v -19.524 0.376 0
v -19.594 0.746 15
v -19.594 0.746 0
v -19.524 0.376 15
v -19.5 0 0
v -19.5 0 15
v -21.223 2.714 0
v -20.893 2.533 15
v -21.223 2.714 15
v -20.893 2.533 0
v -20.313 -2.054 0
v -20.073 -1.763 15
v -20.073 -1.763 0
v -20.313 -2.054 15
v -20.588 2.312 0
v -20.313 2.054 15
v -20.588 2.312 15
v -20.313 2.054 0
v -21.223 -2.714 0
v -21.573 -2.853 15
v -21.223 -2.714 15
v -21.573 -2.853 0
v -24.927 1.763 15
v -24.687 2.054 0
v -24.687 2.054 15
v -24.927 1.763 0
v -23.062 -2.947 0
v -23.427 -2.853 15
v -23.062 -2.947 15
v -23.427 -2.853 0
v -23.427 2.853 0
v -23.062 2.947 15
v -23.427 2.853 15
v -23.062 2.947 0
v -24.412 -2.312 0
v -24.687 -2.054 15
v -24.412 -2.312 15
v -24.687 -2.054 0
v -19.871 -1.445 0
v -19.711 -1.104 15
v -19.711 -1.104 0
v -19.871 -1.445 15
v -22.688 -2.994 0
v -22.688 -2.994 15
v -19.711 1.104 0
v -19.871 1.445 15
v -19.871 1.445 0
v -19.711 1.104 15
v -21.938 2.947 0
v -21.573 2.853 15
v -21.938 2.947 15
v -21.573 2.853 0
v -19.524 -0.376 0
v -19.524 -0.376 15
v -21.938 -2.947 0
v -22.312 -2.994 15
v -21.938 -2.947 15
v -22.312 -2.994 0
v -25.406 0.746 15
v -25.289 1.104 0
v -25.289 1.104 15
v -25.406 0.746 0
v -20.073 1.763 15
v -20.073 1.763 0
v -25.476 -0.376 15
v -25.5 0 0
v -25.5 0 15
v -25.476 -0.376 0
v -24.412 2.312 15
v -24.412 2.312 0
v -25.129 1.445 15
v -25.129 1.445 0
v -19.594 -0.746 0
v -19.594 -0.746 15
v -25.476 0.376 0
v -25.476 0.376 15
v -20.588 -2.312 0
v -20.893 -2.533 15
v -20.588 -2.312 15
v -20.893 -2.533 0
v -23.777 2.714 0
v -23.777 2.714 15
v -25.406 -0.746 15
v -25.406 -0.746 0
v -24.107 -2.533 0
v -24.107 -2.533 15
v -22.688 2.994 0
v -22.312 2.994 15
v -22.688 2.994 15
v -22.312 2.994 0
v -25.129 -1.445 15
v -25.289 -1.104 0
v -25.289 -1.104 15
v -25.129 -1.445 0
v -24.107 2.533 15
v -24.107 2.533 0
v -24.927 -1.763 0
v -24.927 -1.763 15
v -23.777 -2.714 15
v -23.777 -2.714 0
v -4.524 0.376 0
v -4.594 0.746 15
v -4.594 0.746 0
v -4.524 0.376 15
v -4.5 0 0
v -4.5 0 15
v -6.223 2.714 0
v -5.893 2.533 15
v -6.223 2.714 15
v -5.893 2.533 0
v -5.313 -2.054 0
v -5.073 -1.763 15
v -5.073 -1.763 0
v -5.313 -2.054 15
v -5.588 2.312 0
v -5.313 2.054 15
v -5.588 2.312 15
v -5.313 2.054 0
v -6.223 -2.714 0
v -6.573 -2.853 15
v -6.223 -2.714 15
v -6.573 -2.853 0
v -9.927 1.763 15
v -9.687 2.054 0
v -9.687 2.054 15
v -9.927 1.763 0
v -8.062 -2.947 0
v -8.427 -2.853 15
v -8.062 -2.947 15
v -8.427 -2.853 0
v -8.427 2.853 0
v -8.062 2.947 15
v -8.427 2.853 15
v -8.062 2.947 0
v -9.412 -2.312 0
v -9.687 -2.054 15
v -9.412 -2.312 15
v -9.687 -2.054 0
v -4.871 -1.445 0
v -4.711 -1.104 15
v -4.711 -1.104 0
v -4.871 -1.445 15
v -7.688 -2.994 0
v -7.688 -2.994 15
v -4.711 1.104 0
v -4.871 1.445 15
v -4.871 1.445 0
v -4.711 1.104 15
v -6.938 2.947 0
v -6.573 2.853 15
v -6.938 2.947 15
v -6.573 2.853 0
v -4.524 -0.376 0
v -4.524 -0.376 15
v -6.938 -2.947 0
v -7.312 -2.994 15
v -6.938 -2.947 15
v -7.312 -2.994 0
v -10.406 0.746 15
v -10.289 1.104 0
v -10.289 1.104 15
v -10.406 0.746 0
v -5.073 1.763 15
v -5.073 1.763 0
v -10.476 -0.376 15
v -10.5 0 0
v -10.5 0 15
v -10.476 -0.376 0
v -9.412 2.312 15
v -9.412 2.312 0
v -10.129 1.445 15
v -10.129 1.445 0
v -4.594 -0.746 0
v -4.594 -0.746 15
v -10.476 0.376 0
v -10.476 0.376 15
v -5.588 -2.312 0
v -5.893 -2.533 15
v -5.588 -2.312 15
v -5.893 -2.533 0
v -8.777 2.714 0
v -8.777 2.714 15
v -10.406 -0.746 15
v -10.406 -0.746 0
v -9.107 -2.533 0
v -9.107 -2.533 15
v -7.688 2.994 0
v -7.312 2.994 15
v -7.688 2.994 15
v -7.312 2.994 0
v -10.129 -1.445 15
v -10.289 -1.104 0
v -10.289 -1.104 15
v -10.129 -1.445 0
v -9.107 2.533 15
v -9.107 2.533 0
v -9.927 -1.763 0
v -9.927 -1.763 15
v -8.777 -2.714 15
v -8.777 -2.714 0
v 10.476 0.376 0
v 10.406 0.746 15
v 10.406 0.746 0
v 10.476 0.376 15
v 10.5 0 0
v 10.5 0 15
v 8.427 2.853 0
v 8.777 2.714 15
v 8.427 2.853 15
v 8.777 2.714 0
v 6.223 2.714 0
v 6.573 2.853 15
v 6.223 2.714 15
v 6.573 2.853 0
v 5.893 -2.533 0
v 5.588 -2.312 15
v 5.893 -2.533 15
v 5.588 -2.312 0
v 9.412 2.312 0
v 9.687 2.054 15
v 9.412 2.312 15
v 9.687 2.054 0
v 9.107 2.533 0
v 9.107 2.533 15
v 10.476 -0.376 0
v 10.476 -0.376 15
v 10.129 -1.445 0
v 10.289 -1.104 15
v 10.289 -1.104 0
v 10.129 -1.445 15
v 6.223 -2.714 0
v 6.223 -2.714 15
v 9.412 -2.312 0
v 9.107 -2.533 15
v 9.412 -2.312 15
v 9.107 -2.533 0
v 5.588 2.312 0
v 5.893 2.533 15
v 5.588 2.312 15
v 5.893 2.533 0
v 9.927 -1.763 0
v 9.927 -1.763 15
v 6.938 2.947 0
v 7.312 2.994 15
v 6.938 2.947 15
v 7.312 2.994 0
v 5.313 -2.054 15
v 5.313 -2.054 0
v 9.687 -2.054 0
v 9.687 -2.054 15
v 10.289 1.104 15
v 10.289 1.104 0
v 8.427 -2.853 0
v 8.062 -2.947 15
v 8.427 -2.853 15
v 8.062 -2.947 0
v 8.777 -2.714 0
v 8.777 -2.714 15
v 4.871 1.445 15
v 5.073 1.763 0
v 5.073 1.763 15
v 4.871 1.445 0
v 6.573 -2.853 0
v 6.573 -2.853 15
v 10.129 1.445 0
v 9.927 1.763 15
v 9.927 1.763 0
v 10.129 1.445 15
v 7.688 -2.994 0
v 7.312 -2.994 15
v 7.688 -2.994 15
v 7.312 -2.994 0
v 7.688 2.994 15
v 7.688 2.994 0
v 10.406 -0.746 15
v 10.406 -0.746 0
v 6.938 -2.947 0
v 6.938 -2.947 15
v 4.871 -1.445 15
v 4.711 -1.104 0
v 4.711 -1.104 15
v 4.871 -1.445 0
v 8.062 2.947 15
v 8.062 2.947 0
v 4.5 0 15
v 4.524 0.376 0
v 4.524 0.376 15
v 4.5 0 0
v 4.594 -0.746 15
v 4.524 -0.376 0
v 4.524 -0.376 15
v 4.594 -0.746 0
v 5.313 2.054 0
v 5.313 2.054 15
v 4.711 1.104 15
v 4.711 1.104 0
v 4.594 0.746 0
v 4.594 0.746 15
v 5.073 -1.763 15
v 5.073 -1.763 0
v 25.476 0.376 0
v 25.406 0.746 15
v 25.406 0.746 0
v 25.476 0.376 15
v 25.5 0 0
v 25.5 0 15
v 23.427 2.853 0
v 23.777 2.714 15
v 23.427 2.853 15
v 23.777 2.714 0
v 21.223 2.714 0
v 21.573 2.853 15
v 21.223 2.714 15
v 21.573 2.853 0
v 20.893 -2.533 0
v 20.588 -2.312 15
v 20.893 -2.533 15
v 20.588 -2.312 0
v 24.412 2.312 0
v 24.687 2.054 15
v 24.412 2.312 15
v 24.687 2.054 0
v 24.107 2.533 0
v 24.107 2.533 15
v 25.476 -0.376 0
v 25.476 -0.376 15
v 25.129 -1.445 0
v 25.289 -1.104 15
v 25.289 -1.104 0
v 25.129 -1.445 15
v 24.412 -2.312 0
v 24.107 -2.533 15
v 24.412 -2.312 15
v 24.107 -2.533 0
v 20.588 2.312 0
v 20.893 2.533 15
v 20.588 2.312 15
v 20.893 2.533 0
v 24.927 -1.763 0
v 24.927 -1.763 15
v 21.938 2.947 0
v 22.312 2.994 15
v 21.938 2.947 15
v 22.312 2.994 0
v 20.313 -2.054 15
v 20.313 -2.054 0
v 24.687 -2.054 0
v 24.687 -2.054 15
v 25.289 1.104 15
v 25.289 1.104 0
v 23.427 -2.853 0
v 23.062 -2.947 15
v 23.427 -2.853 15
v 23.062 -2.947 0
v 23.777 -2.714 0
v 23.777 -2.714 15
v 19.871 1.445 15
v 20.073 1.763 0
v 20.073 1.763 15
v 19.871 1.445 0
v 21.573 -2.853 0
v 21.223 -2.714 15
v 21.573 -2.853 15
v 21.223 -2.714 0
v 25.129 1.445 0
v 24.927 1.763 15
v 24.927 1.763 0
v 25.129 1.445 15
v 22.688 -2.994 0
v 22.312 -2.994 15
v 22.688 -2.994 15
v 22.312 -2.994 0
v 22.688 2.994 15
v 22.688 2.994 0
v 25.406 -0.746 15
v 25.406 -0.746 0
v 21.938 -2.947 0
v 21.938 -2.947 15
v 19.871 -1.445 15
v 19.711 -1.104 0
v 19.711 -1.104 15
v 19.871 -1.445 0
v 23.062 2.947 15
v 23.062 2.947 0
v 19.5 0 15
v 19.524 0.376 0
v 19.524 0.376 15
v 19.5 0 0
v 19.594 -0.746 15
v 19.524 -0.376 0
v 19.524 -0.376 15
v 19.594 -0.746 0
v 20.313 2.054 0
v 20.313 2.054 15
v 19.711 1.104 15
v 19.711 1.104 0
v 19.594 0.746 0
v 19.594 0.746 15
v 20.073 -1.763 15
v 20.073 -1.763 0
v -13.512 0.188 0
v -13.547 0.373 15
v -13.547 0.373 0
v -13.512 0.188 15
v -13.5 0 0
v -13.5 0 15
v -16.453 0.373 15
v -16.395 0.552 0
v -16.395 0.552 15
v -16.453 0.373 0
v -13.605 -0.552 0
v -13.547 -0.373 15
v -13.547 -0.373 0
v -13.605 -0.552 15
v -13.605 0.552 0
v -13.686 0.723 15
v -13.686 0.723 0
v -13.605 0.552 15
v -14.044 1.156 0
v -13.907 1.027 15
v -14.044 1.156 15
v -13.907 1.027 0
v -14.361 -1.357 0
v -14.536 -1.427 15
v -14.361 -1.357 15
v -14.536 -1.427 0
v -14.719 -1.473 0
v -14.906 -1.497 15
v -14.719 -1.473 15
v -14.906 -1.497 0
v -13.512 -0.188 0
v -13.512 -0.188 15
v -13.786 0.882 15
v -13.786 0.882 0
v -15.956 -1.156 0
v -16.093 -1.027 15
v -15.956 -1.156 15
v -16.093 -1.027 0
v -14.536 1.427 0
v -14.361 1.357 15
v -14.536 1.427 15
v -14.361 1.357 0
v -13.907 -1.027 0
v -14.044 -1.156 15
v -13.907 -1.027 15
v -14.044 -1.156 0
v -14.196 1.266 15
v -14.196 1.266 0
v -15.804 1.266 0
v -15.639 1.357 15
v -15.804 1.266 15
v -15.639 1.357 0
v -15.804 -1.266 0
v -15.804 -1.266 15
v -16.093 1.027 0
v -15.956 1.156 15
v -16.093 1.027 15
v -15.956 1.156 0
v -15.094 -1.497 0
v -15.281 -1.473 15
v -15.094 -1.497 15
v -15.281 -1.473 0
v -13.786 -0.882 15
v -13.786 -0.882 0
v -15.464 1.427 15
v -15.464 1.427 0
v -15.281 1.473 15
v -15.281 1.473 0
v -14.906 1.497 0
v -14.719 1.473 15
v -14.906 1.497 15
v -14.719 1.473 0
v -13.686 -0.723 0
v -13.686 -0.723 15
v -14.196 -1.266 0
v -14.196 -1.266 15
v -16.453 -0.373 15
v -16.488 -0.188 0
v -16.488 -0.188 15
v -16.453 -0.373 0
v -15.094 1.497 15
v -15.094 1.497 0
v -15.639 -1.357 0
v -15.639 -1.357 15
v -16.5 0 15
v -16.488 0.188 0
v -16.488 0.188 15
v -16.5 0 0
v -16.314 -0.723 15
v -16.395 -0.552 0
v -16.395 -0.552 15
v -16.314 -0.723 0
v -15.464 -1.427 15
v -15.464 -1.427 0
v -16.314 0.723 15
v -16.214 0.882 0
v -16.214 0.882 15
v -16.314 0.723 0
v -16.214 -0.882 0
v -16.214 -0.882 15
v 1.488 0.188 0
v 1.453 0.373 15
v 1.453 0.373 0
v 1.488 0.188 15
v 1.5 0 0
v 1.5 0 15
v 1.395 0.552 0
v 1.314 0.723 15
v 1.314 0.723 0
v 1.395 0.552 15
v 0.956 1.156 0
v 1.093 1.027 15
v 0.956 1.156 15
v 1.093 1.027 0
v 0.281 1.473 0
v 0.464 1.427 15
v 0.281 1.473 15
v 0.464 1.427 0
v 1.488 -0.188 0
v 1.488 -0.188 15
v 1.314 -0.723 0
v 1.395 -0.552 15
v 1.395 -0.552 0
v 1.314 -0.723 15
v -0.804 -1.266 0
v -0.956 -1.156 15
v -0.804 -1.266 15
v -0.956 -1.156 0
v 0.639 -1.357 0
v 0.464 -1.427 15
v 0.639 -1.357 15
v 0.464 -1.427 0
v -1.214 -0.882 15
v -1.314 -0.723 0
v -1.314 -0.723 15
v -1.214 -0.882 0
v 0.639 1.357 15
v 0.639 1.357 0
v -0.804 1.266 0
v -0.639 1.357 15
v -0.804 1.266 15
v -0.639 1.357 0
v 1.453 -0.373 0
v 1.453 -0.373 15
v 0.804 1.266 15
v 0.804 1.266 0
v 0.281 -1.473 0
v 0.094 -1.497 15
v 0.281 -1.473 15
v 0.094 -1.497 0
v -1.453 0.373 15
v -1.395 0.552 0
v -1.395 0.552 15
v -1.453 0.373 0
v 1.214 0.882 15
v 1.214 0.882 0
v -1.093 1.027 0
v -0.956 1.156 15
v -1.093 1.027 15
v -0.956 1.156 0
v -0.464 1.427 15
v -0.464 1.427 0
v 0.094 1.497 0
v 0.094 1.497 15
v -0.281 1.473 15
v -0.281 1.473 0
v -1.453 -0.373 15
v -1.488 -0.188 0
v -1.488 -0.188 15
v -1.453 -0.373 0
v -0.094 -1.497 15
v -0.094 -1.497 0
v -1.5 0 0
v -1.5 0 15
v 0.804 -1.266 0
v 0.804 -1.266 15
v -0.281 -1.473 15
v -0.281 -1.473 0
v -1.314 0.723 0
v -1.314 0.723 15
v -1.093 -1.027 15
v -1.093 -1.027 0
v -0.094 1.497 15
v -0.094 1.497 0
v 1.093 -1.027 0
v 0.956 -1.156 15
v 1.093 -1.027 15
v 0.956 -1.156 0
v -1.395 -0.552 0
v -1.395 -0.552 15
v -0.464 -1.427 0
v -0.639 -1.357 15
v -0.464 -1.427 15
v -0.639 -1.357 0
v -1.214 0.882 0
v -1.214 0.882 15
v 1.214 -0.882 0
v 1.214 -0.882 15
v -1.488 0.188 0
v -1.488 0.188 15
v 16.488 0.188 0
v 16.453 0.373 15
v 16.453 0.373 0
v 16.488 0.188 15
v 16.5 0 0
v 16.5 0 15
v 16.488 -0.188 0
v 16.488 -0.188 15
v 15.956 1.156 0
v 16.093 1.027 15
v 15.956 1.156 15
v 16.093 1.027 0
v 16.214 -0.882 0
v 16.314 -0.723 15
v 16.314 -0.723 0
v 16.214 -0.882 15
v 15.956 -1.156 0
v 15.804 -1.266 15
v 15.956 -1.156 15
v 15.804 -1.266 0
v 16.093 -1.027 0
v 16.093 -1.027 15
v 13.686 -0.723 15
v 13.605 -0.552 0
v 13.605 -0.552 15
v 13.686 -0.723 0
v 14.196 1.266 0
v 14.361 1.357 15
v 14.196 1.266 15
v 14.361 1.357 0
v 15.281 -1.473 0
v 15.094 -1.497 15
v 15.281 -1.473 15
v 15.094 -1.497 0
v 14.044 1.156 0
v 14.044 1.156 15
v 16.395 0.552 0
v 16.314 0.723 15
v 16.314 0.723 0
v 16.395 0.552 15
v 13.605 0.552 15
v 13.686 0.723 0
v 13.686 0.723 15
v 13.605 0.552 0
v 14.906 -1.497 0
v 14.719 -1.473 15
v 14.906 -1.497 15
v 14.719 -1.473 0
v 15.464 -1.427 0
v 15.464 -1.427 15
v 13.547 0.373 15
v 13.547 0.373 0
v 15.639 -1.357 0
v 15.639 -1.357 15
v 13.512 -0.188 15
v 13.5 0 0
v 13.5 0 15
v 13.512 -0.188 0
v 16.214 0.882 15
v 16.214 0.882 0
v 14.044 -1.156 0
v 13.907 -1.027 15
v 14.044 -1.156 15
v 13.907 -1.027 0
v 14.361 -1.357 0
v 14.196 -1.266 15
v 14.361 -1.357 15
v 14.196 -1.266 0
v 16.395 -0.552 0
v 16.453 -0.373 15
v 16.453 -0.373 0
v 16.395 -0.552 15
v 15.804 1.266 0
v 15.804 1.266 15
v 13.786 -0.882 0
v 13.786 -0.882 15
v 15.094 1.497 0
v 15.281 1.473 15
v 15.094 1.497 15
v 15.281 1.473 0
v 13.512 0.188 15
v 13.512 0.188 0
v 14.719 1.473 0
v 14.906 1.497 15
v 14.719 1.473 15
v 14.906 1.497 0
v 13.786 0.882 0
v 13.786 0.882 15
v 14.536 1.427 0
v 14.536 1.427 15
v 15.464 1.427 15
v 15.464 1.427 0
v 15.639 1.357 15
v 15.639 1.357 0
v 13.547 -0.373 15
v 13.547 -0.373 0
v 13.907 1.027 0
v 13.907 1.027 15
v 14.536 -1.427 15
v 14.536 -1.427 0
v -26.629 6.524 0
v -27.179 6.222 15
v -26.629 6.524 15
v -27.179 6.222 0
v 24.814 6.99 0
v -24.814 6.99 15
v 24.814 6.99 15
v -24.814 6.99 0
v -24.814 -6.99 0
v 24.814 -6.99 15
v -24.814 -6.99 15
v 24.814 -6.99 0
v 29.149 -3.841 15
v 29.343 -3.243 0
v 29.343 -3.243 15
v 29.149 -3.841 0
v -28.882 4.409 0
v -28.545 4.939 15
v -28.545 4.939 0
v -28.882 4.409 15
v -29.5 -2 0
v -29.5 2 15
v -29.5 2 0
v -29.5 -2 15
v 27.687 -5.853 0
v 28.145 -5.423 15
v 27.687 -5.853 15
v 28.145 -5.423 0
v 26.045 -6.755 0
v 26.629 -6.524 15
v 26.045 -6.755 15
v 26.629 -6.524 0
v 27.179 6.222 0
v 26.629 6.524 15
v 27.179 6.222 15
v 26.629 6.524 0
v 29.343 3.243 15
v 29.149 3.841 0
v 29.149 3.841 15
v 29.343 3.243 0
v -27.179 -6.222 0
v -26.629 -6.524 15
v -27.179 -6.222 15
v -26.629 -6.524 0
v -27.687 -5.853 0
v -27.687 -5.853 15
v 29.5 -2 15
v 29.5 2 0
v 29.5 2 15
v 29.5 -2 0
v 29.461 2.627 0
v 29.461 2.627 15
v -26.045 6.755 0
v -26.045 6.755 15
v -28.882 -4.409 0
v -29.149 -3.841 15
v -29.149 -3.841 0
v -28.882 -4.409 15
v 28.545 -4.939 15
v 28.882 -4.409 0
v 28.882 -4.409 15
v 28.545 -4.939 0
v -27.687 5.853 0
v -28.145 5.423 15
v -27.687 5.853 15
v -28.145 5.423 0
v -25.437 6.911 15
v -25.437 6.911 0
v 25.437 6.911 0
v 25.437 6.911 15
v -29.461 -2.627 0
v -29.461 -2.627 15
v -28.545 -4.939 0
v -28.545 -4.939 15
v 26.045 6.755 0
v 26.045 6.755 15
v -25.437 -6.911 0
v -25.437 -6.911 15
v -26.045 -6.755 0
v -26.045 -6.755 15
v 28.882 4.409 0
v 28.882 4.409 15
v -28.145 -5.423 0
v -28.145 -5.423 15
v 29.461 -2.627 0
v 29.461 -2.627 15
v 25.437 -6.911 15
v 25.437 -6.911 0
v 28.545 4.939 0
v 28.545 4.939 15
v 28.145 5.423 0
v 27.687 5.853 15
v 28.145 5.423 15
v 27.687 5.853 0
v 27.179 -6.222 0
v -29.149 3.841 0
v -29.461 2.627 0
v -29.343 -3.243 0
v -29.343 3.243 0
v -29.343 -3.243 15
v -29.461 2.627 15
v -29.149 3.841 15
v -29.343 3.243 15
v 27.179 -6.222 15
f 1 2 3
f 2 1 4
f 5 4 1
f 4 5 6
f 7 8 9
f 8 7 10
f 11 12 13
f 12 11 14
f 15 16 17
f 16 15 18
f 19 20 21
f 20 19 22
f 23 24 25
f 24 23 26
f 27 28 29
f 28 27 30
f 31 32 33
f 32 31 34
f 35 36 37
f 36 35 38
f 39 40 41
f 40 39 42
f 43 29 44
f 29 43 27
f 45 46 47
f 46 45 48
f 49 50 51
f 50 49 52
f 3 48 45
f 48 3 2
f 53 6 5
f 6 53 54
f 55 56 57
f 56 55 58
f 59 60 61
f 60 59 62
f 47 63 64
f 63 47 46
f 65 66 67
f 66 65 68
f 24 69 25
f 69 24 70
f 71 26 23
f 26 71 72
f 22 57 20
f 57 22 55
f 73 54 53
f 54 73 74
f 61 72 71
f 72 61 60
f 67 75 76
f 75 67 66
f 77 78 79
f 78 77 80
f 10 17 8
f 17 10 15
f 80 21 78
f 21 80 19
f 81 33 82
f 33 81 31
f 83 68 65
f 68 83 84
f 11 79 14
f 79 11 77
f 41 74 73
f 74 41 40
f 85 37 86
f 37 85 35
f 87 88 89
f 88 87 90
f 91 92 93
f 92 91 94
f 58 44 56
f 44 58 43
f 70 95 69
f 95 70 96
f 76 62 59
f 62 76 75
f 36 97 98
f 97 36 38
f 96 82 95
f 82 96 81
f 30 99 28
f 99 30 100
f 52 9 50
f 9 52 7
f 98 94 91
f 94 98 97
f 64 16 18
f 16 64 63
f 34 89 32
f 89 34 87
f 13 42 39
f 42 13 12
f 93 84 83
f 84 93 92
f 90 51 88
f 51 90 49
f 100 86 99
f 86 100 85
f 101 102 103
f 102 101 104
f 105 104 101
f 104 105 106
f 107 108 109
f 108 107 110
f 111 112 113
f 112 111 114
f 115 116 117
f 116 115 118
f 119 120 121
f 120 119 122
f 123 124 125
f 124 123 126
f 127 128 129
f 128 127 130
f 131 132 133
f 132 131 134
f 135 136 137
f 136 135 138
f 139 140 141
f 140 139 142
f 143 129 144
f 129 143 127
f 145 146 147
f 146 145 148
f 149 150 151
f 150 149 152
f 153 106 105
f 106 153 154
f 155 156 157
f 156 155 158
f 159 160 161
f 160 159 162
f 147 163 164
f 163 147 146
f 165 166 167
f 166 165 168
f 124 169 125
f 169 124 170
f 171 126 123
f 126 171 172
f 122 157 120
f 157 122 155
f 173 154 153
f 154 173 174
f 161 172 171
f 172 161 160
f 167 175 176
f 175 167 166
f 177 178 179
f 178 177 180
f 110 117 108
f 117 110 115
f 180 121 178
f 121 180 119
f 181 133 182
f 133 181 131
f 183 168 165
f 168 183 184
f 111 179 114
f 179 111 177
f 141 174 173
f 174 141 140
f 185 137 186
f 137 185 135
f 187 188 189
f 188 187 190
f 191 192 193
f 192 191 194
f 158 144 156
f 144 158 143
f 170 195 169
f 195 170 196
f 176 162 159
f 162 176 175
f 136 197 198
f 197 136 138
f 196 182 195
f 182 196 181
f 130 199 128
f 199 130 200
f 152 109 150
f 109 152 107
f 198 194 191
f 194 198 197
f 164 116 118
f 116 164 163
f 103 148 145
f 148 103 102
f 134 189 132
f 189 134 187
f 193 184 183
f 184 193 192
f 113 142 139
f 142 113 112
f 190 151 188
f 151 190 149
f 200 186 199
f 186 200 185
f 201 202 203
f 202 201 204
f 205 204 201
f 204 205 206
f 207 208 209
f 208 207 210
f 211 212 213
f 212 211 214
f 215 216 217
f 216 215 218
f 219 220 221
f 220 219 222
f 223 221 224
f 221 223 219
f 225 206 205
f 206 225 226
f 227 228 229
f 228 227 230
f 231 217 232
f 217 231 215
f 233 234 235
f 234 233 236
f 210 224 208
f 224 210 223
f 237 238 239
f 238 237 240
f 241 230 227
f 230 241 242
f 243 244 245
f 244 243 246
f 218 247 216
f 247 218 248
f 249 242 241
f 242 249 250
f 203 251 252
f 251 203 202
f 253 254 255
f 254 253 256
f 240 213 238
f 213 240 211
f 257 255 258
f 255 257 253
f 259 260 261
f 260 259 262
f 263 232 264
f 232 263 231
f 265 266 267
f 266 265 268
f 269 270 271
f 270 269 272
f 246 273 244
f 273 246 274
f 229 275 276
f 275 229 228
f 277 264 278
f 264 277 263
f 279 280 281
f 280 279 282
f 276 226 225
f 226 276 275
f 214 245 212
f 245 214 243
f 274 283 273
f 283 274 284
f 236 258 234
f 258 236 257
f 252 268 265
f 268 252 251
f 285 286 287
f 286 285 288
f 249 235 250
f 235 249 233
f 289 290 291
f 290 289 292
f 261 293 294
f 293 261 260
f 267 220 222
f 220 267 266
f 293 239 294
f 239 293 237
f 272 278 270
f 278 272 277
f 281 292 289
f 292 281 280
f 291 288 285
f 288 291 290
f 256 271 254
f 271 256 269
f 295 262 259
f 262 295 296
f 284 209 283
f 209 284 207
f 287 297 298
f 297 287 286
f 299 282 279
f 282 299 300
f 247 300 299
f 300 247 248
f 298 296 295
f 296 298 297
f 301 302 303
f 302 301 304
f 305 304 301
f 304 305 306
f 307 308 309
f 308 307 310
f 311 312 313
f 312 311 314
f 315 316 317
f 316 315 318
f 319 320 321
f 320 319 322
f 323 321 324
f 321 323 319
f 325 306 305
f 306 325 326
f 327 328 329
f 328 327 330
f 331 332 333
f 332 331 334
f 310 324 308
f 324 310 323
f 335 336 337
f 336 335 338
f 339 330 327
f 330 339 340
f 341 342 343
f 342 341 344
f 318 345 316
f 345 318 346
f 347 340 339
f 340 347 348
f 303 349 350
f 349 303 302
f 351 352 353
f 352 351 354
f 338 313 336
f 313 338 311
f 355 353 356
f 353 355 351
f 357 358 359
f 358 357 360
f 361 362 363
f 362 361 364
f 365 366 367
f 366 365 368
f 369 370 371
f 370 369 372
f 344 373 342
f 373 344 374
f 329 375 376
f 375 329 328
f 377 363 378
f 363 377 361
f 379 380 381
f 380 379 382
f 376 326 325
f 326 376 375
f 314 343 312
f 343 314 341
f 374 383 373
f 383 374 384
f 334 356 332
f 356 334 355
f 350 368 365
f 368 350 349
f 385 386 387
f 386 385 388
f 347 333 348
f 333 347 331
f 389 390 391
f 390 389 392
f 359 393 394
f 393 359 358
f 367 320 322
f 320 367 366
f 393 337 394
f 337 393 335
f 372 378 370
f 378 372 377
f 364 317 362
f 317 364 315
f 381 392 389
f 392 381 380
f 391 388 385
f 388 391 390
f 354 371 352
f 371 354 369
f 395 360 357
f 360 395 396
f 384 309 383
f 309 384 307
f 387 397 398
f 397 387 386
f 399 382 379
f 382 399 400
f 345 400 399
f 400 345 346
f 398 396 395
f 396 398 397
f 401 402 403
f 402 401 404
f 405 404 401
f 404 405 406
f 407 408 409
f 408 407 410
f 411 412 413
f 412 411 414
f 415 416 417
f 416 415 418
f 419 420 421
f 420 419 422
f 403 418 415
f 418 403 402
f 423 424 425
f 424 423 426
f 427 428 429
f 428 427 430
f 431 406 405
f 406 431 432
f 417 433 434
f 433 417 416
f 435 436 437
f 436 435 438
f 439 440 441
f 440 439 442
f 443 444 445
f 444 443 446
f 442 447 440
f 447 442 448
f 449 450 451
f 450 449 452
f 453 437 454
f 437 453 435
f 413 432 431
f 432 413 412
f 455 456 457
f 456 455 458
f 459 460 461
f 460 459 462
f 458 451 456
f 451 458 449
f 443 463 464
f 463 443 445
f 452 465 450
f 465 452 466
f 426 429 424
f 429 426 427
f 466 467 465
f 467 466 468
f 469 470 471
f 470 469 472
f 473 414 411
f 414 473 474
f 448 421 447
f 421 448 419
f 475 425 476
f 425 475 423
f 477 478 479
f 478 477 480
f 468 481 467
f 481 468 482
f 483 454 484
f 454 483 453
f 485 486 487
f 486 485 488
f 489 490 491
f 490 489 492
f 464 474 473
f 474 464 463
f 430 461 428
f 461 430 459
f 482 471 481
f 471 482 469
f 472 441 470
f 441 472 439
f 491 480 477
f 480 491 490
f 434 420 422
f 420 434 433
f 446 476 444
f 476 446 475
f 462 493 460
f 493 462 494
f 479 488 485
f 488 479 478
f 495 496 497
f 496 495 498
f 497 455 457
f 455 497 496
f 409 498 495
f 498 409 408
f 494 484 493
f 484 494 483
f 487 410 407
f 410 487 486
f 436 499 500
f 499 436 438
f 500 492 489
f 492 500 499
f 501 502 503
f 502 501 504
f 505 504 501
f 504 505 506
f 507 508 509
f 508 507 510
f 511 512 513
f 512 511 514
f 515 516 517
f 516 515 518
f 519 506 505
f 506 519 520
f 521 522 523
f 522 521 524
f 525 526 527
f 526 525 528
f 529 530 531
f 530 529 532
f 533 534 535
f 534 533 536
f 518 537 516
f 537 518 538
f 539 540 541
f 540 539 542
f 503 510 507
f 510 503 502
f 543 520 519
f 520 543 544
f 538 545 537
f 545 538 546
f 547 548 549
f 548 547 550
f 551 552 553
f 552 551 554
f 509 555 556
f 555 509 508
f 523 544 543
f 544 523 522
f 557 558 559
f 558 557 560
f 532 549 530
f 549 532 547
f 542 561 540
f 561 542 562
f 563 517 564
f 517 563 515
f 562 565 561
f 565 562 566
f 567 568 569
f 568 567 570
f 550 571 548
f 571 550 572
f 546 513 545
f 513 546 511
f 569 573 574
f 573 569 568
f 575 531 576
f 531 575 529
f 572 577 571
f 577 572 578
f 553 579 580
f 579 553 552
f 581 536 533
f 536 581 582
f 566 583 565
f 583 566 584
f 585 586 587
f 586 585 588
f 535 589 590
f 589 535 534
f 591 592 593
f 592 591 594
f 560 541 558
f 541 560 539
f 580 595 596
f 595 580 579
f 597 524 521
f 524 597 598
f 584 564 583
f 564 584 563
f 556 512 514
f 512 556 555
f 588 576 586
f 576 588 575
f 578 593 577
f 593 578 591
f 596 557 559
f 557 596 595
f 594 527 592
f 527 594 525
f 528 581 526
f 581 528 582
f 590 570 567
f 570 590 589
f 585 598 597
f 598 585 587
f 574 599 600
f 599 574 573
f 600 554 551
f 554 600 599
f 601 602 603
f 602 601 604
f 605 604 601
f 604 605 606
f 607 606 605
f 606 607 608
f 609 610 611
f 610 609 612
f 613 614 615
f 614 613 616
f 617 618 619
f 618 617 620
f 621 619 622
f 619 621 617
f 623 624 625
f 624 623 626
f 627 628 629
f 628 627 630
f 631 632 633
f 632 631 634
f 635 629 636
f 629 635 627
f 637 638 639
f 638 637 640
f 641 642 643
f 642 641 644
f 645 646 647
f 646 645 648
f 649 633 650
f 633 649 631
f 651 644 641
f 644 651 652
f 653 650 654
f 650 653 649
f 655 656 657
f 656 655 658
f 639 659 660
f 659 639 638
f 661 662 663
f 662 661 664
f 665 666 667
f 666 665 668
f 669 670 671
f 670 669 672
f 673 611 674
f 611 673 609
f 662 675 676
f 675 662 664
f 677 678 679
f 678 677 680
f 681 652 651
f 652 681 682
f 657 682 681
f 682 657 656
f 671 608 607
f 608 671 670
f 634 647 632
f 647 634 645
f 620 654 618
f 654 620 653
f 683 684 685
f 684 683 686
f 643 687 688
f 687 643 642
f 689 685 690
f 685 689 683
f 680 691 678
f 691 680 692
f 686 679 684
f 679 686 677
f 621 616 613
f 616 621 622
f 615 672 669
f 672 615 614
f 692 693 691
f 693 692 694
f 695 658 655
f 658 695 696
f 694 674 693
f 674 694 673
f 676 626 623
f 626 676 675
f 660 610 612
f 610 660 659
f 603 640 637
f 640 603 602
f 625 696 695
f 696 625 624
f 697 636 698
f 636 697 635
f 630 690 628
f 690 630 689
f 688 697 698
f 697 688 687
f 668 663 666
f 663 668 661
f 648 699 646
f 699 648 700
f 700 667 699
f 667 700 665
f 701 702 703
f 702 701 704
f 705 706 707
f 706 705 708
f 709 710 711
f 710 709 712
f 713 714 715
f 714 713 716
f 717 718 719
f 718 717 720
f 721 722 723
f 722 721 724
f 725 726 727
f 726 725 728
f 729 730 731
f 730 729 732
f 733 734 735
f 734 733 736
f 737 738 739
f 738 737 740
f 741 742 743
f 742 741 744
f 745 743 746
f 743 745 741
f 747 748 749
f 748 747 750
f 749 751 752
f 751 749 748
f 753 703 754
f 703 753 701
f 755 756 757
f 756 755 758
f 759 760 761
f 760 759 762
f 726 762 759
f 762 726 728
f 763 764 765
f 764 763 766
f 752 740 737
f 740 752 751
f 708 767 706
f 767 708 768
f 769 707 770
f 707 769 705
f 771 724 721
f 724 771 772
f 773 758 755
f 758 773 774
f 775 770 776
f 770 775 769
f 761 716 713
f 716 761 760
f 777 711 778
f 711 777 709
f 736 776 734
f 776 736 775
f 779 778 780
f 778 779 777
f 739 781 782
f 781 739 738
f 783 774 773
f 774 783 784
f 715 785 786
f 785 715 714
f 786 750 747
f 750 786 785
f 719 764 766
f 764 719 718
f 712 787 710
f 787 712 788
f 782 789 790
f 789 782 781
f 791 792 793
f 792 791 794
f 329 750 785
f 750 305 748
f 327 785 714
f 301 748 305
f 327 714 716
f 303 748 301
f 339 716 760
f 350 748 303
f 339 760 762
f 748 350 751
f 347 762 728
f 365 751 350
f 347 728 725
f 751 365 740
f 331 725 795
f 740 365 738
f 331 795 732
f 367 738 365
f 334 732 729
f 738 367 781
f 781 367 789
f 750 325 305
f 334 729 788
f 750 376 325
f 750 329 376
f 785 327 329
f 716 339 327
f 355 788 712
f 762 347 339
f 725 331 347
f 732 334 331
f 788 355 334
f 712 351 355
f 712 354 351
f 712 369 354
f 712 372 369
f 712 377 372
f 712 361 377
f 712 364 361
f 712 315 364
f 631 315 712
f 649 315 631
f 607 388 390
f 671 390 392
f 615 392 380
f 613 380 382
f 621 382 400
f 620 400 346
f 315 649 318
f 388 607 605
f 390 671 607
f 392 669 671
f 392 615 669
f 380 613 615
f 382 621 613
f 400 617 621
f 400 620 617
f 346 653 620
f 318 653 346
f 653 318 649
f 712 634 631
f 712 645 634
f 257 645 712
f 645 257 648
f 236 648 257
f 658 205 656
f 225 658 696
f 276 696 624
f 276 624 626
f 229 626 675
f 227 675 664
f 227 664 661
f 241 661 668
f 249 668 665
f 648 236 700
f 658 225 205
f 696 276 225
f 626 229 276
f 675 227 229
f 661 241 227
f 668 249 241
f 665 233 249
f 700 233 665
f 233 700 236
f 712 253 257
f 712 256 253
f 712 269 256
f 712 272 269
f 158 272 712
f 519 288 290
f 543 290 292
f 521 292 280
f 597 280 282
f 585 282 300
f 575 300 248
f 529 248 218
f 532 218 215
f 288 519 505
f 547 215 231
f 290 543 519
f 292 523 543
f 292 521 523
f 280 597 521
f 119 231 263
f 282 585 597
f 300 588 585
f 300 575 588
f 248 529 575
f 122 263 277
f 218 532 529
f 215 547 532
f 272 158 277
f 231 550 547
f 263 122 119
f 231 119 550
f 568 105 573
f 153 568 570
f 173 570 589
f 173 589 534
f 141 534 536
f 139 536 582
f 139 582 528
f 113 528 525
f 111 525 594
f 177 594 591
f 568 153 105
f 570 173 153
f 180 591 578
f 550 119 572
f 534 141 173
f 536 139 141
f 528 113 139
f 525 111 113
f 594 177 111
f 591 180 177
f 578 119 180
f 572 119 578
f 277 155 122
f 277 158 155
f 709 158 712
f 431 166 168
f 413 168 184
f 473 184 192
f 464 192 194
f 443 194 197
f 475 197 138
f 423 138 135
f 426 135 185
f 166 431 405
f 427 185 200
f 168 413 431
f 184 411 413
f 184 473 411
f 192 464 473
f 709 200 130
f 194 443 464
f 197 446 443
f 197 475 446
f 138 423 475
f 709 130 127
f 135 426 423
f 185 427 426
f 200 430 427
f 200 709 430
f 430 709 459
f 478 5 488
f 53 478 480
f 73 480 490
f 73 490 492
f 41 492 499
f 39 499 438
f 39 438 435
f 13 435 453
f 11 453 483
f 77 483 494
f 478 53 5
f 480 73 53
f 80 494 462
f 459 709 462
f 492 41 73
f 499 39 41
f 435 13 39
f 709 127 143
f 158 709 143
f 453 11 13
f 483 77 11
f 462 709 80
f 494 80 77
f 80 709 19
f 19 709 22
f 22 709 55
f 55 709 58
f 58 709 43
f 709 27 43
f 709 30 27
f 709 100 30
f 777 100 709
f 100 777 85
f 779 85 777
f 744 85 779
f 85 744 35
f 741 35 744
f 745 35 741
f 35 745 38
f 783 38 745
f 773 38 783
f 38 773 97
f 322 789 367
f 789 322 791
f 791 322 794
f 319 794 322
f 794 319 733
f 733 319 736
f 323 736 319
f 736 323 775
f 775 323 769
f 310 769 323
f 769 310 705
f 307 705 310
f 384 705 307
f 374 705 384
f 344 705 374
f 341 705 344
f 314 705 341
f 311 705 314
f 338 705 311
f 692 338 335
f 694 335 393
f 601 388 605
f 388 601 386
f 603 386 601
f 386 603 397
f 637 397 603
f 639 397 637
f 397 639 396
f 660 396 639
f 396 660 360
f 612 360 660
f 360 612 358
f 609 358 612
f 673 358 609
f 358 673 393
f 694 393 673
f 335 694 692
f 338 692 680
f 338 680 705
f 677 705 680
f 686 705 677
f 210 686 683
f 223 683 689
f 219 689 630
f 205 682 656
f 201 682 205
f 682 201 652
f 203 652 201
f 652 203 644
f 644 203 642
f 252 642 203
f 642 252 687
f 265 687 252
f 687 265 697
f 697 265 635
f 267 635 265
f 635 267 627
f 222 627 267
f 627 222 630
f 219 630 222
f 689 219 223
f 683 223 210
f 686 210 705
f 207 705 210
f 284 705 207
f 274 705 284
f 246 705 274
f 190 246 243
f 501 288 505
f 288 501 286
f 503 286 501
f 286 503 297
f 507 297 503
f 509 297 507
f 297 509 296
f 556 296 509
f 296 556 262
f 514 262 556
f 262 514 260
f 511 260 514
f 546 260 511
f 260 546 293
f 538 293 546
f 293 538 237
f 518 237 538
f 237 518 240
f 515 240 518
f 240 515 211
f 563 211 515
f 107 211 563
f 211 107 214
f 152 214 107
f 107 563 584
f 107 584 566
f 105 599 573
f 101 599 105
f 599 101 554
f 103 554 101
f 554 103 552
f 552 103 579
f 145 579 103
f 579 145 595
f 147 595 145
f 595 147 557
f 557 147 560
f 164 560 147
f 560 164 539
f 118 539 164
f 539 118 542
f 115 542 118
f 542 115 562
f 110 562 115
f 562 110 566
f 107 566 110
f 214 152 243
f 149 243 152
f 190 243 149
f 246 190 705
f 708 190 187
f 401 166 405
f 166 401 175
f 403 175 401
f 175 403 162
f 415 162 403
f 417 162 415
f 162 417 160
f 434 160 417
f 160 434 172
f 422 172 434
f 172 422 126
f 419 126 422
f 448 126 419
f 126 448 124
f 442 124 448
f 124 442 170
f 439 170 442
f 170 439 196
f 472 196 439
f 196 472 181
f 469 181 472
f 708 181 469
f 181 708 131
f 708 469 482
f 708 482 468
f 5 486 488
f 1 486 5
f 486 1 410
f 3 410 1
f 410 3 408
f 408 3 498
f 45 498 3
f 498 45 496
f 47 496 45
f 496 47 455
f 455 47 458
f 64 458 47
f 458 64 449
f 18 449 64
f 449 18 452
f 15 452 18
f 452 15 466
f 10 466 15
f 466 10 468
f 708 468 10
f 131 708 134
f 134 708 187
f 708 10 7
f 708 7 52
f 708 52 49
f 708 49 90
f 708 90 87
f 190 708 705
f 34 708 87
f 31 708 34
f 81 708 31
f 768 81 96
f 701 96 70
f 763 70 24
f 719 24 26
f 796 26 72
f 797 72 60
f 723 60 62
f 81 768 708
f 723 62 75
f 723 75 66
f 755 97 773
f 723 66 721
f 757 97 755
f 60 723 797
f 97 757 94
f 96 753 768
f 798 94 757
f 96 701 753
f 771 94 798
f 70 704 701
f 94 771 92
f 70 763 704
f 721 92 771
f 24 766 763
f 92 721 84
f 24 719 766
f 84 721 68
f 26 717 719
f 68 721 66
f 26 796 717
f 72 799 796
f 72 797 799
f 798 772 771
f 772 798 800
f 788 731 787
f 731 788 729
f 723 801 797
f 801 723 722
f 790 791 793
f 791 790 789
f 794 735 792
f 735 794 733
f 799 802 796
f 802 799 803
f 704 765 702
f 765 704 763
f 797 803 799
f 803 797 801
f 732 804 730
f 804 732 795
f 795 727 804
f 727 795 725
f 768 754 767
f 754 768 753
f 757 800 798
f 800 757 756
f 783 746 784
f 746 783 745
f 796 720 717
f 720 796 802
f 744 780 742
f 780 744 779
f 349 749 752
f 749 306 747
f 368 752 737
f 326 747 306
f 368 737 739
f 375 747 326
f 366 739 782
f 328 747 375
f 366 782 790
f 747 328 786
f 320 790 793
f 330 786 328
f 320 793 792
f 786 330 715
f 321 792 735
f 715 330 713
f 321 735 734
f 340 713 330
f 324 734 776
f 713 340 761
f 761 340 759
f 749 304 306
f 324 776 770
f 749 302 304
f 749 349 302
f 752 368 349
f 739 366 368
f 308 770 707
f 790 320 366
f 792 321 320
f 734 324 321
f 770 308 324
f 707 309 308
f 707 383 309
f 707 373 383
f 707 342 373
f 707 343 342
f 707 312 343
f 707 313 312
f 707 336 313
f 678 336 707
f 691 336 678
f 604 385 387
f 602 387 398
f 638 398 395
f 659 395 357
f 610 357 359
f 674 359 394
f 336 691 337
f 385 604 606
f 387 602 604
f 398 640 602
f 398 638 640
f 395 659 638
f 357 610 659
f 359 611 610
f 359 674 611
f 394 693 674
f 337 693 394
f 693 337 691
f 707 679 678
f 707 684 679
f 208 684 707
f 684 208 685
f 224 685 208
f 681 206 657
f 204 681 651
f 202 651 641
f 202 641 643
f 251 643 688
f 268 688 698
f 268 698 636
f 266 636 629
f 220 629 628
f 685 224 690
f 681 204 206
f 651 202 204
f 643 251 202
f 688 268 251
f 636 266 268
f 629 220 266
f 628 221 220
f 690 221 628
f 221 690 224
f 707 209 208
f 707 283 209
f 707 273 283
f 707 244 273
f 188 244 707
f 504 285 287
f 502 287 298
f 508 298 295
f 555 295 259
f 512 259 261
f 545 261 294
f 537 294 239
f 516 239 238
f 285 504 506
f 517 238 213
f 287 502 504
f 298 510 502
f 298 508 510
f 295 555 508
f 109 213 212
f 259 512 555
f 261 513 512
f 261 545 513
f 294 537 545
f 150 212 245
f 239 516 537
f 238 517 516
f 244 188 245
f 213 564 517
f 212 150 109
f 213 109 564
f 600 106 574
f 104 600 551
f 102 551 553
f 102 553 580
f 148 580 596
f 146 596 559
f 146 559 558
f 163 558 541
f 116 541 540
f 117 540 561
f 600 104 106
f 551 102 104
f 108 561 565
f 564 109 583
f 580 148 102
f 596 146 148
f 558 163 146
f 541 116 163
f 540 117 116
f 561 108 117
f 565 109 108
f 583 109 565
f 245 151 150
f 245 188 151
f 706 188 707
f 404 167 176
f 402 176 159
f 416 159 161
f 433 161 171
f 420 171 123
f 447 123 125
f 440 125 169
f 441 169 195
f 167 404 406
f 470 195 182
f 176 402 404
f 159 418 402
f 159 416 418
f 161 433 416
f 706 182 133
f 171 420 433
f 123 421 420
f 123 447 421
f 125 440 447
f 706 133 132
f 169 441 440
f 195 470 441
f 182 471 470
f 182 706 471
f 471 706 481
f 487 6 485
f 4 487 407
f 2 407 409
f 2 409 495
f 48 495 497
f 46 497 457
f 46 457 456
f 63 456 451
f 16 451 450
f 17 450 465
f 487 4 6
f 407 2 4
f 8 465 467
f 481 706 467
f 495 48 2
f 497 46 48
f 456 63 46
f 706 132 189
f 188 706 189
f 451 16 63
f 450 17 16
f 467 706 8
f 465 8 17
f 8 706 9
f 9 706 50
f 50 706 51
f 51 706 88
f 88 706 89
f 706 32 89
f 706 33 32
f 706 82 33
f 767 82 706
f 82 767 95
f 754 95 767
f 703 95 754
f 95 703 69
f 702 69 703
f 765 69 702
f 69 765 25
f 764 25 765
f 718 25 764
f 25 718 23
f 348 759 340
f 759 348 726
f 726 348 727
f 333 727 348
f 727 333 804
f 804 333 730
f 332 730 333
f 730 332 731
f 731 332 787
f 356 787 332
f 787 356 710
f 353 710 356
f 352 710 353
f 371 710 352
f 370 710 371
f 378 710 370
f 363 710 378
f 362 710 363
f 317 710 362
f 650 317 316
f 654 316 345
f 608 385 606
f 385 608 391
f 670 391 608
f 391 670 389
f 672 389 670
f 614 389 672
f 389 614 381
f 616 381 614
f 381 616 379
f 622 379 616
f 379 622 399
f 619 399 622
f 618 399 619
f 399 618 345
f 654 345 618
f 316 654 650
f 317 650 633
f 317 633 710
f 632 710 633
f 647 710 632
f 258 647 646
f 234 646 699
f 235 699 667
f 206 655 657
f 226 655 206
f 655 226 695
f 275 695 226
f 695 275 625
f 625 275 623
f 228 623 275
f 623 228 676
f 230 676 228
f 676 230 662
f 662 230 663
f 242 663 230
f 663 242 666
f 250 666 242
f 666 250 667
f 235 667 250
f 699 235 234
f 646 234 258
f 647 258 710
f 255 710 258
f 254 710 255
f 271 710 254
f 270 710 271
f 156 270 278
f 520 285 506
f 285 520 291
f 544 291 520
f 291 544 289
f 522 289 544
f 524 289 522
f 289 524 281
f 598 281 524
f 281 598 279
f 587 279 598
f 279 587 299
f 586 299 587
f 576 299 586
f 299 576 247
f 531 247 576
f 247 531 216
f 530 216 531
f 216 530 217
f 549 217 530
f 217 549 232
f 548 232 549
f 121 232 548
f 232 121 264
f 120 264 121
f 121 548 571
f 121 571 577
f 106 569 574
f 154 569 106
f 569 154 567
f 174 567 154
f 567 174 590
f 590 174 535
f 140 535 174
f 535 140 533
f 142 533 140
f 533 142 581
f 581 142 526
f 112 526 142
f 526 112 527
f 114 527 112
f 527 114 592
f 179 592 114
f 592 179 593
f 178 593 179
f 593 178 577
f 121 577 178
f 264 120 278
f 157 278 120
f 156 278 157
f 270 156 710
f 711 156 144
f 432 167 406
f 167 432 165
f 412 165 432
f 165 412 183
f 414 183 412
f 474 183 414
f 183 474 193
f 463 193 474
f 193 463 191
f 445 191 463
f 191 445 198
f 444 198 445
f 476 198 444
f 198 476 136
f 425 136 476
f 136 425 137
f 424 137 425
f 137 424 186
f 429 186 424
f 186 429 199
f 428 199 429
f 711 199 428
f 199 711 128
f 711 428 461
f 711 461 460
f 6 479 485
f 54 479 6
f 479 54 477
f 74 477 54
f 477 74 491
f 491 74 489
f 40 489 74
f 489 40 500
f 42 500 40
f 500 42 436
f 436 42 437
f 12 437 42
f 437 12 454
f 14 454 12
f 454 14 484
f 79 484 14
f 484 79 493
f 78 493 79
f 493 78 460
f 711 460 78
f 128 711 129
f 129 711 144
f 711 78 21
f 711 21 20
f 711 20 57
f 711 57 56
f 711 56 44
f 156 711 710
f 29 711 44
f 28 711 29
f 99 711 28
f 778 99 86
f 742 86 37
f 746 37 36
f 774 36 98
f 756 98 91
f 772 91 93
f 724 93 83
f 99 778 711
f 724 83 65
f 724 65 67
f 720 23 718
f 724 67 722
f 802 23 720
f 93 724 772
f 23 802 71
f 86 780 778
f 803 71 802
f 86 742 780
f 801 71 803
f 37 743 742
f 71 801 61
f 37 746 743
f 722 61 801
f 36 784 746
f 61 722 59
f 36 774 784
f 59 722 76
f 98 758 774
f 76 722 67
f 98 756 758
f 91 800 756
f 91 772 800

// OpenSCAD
$fn = 50;


difference() {
	union() {
		hull() {
			translate(v = [-24.5000000000, 2.0000000000, 0]) {
				cylinder(h = 15, r = 5);
			}
			translate(v = [24.5000000000, 2.0000000000, 0]) {
				cylinder(h = 15, r = 5);
			}
			translate(v = [-24.5000000000, -2.0000000000, 0]) {
				cylinder(h = 15, r = 5);
			}
			translate(v = [24.5000000000, -2.0000000000, 0]) {
				cylinder(h = 15, r = 5);
			}
		}
	}
	union() {
		translate(v = [-22.5000000000, 0.0000000000, 0]) {
			translate(v = [0, 0, -100]) {
				cylinder(h = 200, r = 3.0000000000);
			}
		}
		translate(v = [-7.5000000000, 0.0000000000, 0]) {
			translate(v = [0, 0, -100]) {
				cylinder(h = 200, r = 3.0000000000);
			}
		}
		translate(v = [7.5000000000, 0.0000000000, 0]) {
			translate(v = [0, 0, -100]) {
				cylinder(h = 200, r = 3.0000000000);
			}
		}
		translate(v = [22.5000000000, 0.0000000000, 0]) {
			translate(v = [0, 0, -100]) {
				cylinder(h = 200, r = 3.0000000000);
			}
		}
		translate(v = [-22.5000000000, 0.0000000000, 0]) {
			translate(v = [0, 0, -100]) {
				cylinder(h = 200, r = 1.5000000000);
			}
		}
		translate(v = [-15.0000000000, 0.0000000000, 0]) {
			translate(v = [0, 0, -100]) {
				cylinder(h = 200, r = 1.5000000000);
			}
		}
		translate(v = [-7.5000000000, 0.0000000000, 0]) {
			translate(v = [0, 0, -100]) {
				cylinder(h = 200, r = 1.5000000000);
			}
		}
		translate(v = [0, 0, -100]) {
			cylinder(h = 200, r = 1.5000000000);
		}
		translate(v = [7.5000000000, 0.0000000000, 0]) {
			translate(v = [0, 0, -100]) {
				cylinder(h = 200, r = 1.5000000000);
			}
		}
		translate(v = [15.0000000000, 0.0000000000, 0]) {
			translate(v = [0, 0, -100]) {
				cylinder(h = 200, r = 1.5000000000);
			}
		}
		translate(v = [22.5000000000, 0.0000000000, 0]) {
			translate(v = [0, 0, -100]) {
				cylinder(h = 200, r = 1.5000000000);
			}
		}
	}
}
